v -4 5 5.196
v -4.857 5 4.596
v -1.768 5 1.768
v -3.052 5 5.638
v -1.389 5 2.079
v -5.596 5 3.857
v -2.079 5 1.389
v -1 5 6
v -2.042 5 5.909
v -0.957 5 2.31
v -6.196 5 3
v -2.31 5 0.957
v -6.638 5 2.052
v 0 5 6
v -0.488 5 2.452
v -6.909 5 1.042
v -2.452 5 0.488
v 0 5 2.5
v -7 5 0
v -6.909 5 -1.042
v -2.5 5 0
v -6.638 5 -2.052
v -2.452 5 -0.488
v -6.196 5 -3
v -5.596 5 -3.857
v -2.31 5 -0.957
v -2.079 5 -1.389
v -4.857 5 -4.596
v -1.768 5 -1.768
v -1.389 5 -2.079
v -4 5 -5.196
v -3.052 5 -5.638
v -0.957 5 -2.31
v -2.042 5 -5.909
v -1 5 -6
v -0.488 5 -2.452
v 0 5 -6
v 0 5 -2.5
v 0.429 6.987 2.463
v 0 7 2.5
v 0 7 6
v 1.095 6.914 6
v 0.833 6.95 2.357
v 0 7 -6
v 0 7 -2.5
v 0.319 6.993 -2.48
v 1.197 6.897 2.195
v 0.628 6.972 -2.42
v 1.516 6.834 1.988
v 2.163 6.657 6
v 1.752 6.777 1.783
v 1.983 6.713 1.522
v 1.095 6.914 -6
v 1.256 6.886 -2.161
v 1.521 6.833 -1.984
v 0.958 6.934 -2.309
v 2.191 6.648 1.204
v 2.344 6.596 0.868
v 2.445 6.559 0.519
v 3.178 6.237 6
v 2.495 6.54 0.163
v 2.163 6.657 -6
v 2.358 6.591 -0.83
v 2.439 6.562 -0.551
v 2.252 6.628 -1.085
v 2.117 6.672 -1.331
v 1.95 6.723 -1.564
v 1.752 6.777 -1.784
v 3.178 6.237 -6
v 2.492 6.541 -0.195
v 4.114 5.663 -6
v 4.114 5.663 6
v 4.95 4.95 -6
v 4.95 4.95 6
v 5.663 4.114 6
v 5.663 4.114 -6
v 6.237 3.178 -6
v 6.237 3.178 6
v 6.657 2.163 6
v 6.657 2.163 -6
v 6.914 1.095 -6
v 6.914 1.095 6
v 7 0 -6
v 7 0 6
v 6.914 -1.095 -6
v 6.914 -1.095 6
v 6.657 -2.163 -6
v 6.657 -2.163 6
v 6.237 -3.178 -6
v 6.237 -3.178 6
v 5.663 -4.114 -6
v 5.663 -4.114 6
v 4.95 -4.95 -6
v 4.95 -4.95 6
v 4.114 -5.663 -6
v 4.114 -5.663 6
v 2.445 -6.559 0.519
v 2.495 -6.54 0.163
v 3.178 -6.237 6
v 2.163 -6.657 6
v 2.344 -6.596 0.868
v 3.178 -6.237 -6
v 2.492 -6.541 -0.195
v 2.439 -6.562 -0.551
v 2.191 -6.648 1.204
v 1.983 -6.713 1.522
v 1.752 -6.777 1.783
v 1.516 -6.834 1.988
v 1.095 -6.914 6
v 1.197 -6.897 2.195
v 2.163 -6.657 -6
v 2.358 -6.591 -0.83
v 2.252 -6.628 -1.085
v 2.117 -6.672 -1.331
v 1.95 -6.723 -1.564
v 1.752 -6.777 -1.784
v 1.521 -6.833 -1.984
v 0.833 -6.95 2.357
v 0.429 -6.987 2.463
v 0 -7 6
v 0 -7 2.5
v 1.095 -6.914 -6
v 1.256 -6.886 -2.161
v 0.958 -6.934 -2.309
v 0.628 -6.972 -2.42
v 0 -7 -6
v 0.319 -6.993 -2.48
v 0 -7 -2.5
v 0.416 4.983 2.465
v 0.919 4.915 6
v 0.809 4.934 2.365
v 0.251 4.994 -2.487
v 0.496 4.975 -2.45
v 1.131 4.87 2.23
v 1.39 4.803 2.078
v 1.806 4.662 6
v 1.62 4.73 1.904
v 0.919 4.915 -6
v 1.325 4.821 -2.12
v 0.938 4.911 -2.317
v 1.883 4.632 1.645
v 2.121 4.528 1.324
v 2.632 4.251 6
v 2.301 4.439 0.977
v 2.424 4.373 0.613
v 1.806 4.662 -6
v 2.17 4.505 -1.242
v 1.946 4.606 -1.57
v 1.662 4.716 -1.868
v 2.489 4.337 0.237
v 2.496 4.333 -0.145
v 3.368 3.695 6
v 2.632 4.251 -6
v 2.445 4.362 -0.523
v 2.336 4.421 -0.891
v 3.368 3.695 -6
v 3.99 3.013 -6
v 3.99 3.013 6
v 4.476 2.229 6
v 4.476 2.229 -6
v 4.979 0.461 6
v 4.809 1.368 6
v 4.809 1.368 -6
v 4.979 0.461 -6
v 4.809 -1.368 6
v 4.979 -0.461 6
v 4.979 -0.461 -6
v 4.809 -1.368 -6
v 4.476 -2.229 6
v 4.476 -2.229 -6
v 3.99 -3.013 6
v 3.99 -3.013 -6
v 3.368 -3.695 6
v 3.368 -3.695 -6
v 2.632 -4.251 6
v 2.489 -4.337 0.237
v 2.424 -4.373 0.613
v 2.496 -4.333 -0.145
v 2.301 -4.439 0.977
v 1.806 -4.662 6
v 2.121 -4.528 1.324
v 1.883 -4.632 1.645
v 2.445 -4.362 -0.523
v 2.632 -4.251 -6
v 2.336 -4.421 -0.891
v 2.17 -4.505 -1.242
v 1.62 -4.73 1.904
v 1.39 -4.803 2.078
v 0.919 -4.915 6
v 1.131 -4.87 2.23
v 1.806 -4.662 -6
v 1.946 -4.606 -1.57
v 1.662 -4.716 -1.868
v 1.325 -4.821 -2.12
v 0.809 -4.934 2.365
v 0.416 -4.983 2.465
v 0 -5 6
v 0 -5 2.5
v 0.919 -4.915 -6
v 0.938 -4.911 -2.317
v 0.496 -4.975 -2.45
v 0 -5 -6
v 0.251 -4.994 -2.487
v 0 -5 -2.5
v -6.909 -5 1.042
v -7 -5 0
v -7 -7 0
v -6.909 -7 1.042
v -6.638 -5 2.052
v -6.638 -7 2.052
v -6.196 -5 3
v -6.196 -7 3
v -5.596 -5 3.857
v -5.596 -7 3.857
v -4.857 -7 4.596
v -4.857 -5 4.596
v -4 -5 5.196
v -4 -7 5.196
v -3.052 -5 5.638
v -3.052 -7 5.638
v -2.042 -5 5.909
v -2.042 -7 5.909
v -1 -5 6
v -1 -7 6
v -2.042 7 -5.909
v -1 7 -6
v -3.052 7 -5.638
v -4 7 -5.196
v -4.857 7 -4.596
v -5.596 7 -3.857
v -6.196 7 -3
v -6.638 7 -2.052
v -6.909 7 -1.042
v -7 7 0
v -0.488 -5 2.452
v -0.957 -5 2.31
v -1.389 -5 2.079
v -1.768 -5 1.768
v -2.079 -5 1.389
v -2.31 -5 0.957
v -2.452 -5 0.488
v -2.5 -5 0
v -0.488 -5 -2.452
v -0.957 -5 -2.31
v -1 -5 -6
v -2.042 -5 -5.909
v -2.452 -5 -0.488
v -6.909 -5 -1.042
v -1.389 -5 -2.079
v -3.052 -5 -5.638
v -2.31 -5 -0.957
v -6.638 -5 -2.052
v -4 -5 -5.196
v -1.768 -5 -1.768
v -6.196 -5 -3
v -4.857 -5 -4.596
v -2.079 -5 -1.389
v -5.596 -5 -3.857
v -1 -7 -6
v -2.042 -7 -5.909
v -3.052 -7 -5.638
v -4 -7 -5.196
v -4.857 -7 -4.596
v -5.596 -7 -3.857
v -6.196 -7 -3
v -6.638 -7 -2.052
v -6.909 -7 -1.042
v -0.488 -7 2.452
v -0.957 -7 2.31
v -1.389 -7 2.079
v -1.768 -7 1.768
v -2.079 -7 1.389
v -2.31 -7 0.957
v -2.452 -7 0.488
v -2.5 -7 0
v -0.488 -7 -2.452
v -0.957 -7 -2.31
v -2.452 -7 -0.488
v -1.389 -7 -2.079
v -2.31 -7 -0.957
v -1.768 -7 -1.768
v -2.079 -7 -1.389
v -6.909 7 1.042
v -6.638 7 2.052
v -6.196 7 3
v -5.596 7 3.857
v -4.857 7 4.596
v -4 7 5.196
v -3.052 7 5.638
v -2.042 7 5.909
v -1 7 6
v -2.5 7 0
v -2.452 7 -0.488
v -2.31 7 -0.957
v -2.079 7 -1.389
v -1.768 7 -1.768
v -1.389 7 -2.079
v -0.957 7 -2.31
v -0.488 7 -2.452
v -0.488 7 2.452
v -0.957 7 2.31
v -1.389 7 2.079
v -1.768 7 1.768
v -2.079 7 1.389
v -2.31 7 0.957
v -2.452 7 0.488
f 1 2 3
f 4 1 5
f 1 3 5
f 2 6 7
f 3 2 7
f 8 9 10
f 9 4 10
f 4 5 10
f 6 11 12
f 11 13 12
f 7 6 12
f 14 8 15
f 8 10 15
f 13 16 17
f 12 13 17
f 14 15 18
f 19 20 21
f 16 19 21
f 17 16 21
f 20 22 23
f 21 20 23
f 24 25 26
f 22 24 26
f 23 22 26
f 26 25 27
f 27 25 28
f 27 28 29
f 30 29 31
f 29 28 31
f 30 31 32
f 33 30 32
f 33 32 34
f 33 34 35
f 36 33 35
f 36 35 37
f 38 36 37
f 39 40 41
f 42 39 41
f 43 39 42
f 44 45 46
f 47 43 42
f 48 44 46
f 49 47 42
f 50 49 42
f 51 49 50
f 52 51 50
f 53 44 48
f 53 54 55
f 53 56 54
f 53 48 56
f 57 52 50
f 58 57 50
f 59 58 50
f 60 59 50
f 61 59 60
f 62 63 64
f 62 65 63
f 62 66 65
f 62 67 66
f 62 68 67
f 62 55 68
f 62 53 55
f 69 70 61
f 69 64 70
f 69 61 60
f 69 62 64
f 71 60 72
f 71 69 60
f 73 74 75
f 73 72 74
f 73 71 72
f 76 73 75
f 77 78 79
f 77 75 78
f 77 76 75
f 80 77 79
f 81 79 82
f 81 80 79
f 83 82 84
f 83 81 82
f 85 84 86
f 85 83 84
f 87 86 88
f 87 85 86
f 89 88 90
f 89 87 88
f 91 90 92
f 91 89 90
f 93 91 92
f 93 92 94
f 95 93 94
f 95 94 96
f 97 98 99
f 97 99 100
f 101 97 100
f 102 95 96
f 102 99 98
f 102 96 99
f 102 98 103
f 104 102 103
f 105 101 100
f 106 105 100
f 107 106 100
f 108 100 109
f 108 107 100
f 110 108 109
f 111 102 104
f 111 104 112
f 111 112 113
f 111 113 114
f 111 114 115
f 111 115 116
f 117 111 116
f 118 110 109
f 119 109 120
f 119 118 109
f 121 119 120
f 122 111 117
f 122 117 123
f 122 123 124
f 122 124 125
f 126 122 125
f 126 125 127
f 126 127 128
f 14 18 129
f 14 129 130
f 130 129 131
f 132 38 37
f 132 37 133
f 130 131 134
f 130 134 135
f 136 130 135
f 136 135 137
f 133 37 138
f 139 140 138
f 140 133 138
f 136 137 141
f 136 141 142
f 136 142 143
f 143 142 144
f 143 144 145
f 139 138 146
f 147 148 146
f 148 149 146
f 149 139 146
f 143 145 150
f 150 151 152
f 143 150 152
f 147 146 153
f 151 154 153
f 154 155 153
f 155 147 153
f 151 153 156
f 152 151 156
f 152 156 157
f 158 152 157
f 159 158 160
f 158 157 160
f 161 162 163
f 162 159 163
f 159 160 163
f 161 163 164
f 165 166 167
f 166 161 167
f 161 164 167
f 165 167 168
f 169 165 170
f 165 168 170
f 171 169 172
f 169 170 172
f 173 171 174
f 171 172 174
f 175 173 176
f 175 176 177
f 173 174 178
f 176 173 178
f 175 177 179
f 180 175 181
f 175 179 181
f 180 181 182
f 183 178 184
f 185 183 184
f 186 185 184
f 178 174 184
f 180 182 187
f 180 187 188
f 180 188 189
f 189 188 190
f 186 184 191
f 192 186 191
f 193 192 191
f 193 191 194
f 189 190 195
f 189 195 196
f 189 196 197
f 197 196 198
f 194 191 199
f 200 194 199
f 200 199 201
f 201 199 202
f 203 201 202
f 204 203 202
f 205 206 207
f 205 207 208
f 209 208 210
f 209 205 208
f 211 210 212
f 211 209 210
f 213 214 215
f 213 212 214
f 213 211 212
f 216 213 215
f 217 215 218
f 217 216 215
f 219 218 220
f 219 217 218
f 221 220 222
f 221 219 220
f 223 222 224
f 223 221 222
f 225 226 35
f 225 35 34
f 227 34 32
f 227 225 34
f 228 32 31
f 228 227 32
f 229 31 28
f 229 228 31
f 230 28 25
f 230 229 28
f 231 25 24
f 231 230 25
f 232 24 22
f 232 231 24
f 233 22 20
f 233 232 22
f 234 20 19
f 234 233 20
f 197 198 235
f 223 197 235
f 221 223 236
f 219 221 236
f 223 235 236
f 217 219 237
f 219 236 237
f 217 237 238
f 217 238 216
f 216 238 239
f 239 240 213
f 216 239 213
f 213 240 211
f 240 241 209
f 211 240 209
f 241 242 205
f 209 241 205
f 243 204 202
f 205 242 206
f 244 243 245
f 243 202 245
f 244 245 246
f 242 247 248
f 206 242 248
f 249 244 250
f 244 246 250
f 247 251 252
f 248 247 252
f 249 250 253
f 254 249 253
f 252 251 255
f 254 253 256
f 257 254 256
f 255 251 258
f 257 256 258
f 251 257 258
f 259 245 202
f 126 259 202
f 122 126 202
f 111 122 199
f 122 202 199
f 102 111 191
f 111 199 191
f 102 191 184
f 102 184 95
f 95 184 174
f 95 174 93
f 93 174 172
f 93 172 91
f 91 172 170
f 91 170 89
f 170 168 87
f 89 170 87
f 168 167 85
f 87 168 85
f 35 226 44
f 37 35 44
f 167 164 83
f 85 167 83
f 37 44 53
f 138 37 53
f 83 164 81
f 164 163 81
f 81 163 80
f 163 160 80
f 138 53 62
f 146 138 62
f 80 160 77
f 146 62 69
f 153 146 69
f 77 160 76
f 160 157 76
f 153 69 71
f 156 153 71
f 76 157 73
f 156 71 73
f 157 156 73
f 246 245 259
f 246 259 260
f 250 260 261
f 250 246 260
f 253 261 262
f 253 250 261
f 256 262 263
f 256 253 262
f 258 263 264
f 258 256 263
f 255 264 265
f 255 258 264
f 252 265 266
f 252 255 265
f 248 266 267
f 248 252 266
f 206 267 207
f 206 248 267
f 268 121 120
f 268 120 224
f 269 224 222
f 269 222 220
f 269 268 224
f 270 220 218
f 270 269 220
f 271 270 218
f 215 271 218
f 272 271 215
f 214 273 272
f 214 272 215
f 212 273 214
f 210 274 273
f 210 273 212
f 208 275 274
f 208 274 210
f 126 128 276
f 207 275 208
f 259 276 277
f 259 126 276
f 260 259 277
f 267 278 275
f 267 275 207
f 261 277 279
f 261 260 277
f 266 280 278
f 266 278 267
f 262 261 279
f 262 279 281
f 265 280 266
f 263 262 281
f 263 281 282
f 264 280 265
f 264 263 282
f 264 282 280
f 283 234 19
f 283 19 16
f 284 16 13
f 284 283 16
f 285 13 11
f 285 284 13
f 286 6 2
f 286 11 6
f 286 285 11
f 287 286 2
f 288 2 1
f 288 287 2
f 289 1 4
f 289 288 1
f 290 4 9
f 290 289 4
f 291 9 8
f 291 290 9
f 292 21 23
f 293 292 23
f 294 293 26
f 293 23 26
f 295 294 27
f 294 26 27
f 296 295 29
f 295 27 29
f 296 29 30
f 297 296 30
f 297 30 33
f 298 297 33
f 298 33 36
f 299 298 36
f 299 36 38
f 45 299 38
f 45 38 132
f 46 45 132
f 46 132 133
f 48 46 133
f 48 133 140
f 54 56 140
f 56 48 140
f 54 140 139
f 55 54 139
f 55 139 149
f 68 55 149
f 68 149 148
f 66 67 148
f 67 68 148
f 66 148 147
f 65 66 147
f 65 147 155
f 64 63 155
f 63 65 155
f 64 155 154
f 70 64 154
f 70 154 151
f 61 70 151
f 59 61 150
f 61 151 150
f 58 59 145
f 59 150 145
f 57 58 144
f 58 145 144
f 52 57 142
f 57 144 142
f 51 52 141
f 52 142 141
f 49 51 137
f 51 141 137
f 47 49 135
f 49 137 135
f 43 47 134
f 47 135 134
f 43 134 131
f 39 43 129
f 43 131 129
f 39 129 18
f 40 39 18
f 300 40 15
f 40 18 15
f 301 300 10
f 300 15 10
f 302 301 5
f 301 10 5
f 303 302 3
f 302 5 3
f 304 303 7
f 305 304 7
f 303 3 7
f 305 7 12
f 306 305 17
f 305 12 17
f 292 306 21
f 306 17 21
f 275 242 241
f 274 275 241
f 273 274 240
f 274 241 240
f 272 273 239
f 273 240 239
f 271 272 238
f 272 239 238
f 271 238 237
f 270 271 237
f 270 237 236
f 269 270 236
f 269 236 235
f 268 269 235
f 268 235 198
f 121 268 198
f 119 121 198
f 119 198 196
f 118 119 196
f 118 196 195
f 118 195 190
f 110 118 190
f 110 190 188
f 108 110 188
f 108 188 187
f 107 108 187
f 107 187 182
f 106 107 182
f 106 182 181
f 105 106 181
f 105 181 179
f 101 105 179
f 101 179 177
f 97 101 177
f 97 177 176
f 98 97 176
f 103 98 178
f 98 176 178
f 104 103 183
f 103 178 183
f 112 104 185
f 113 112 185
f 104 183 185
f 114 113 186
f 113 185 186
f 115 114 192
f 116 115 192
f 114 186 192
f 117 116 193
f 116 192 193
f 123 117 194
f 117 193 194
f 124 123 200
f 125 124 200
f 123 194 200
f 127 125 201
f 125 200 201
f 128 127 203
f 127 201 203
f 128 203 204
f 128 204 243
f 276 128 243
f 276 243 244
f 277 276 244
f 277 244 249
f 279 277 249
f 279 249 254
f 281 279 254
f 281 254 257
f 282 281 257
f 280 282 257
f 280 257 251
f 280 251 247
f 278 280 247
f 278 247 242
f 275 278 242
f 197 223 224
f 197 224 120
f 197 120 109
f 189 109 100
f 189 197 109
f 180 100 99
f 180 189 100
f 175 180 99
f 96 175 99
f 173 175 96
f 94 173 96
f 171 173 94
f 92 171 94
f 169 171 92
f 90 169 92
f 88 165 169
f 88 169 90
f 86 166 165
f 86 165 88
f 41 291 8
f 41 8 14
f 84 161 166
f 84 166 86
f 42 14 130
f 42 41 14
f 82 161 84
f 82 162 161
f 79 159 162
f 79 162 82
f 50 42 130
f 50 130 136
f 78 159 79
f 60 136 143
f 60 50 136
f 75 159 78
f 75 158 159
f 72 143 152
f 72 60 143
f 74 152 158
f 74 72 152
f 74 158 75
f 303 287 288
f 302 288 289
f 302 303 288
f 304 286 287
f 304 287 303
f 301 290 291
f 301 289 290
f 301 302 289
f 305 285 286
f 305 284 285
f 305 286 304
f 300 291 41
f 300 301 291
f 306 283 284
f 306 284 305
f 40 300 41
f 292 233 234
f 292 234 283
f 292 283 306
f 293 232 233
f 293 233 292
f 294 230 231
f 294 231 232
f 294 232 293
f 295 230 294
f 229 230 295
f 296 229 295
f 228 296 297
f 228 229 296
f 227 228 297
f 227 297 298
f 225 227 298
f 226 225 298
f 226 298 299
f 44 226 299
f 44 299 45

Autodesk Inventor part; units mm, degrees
ref_plane "YZ Plane" through (0, 0, 0) normal (1, 0, 0) x (0, 1, 0)
ref_plane "XZ Plane" through (0, 0, 0) normal (0, 1, 0) x (-1, 0, 0)
ref_plane "XY Plane" through (0, 0, 0) normal (0, 0, 1) x (1, 0, 0)
sketch "Sketch4" plane through (0, 0, 0) normal (0, 0, 1) x (1, 0, 0)
  arc A0 (0, -5) -> (0, 5) centre (0, 0) ccw
  line L0 (0, -5) -> (-7, -5)
  line L1 (-5, -5) -> (-5, 5) construction
  line L2 (-7, 5) -> (0, 5)
  line L3 (0, 5) -> (0, -5) construction
  arc A1 (-5, 0) -> (0, -5) centre (0, 0) ccw construction
  arc A2 (0, 5) -> (-5, 0) centre (0, 0) ccw construction
  arc A3 (-5, -4.899) -> (-4.899, -5) centre (0, 0) ccw construction
  line L4 (0, -7) -> (-7, -7)
  line L5 (-7, -7) -> (-7, -5)
  line L6 (-7, 7) -> (0, 7)
  arc A4 (-7, 0) -> (-5, -4.899) centre (0, 0) ccw construction
  arc A5 (-5, 4.899) -> (-7, 0) centre (0, 0) ccw construction
  arc A6 (-4.899, 5) -> (-5, 4.899) centre (0, 0) ccw construction
  arc A7 (0, 7) -> (-4.899, 5) centre (0, 0) ccw construction
  arc A8 (-4.899, -5) -> (0, -7) centre (0, 0) ccw construction
  arc A9 (0, -7) -> (0, 7) centre (0, 0) ccw
  line L7 (-7, -5) -> (-7, 5) construction
  line L8 (-7, 5) -> (-7, 7)
  dimension "d14" = 10
  dimension "d15" = 2
extrude "Extrusion4" add sketch "Sketch4" along normal mid plane 12
sketch "Sketch5" plane through (0, 0, 0) normal (0, 1, 0) x (-1, 0, 0)
  circle A0 centre (0, 0) radius 2.5
  dimension "d18" = 5
extrude "Extrusion5" cut sketch "Sketch5" along normal through all both and the other way through all
fillet "Fillet1" radius 6 4 edges at (-7, 6, 6) (-7, 6, -6) (-7, -6, -6) (-7, -6, 6)
properties part number "tip-protector" material "Rubber"
